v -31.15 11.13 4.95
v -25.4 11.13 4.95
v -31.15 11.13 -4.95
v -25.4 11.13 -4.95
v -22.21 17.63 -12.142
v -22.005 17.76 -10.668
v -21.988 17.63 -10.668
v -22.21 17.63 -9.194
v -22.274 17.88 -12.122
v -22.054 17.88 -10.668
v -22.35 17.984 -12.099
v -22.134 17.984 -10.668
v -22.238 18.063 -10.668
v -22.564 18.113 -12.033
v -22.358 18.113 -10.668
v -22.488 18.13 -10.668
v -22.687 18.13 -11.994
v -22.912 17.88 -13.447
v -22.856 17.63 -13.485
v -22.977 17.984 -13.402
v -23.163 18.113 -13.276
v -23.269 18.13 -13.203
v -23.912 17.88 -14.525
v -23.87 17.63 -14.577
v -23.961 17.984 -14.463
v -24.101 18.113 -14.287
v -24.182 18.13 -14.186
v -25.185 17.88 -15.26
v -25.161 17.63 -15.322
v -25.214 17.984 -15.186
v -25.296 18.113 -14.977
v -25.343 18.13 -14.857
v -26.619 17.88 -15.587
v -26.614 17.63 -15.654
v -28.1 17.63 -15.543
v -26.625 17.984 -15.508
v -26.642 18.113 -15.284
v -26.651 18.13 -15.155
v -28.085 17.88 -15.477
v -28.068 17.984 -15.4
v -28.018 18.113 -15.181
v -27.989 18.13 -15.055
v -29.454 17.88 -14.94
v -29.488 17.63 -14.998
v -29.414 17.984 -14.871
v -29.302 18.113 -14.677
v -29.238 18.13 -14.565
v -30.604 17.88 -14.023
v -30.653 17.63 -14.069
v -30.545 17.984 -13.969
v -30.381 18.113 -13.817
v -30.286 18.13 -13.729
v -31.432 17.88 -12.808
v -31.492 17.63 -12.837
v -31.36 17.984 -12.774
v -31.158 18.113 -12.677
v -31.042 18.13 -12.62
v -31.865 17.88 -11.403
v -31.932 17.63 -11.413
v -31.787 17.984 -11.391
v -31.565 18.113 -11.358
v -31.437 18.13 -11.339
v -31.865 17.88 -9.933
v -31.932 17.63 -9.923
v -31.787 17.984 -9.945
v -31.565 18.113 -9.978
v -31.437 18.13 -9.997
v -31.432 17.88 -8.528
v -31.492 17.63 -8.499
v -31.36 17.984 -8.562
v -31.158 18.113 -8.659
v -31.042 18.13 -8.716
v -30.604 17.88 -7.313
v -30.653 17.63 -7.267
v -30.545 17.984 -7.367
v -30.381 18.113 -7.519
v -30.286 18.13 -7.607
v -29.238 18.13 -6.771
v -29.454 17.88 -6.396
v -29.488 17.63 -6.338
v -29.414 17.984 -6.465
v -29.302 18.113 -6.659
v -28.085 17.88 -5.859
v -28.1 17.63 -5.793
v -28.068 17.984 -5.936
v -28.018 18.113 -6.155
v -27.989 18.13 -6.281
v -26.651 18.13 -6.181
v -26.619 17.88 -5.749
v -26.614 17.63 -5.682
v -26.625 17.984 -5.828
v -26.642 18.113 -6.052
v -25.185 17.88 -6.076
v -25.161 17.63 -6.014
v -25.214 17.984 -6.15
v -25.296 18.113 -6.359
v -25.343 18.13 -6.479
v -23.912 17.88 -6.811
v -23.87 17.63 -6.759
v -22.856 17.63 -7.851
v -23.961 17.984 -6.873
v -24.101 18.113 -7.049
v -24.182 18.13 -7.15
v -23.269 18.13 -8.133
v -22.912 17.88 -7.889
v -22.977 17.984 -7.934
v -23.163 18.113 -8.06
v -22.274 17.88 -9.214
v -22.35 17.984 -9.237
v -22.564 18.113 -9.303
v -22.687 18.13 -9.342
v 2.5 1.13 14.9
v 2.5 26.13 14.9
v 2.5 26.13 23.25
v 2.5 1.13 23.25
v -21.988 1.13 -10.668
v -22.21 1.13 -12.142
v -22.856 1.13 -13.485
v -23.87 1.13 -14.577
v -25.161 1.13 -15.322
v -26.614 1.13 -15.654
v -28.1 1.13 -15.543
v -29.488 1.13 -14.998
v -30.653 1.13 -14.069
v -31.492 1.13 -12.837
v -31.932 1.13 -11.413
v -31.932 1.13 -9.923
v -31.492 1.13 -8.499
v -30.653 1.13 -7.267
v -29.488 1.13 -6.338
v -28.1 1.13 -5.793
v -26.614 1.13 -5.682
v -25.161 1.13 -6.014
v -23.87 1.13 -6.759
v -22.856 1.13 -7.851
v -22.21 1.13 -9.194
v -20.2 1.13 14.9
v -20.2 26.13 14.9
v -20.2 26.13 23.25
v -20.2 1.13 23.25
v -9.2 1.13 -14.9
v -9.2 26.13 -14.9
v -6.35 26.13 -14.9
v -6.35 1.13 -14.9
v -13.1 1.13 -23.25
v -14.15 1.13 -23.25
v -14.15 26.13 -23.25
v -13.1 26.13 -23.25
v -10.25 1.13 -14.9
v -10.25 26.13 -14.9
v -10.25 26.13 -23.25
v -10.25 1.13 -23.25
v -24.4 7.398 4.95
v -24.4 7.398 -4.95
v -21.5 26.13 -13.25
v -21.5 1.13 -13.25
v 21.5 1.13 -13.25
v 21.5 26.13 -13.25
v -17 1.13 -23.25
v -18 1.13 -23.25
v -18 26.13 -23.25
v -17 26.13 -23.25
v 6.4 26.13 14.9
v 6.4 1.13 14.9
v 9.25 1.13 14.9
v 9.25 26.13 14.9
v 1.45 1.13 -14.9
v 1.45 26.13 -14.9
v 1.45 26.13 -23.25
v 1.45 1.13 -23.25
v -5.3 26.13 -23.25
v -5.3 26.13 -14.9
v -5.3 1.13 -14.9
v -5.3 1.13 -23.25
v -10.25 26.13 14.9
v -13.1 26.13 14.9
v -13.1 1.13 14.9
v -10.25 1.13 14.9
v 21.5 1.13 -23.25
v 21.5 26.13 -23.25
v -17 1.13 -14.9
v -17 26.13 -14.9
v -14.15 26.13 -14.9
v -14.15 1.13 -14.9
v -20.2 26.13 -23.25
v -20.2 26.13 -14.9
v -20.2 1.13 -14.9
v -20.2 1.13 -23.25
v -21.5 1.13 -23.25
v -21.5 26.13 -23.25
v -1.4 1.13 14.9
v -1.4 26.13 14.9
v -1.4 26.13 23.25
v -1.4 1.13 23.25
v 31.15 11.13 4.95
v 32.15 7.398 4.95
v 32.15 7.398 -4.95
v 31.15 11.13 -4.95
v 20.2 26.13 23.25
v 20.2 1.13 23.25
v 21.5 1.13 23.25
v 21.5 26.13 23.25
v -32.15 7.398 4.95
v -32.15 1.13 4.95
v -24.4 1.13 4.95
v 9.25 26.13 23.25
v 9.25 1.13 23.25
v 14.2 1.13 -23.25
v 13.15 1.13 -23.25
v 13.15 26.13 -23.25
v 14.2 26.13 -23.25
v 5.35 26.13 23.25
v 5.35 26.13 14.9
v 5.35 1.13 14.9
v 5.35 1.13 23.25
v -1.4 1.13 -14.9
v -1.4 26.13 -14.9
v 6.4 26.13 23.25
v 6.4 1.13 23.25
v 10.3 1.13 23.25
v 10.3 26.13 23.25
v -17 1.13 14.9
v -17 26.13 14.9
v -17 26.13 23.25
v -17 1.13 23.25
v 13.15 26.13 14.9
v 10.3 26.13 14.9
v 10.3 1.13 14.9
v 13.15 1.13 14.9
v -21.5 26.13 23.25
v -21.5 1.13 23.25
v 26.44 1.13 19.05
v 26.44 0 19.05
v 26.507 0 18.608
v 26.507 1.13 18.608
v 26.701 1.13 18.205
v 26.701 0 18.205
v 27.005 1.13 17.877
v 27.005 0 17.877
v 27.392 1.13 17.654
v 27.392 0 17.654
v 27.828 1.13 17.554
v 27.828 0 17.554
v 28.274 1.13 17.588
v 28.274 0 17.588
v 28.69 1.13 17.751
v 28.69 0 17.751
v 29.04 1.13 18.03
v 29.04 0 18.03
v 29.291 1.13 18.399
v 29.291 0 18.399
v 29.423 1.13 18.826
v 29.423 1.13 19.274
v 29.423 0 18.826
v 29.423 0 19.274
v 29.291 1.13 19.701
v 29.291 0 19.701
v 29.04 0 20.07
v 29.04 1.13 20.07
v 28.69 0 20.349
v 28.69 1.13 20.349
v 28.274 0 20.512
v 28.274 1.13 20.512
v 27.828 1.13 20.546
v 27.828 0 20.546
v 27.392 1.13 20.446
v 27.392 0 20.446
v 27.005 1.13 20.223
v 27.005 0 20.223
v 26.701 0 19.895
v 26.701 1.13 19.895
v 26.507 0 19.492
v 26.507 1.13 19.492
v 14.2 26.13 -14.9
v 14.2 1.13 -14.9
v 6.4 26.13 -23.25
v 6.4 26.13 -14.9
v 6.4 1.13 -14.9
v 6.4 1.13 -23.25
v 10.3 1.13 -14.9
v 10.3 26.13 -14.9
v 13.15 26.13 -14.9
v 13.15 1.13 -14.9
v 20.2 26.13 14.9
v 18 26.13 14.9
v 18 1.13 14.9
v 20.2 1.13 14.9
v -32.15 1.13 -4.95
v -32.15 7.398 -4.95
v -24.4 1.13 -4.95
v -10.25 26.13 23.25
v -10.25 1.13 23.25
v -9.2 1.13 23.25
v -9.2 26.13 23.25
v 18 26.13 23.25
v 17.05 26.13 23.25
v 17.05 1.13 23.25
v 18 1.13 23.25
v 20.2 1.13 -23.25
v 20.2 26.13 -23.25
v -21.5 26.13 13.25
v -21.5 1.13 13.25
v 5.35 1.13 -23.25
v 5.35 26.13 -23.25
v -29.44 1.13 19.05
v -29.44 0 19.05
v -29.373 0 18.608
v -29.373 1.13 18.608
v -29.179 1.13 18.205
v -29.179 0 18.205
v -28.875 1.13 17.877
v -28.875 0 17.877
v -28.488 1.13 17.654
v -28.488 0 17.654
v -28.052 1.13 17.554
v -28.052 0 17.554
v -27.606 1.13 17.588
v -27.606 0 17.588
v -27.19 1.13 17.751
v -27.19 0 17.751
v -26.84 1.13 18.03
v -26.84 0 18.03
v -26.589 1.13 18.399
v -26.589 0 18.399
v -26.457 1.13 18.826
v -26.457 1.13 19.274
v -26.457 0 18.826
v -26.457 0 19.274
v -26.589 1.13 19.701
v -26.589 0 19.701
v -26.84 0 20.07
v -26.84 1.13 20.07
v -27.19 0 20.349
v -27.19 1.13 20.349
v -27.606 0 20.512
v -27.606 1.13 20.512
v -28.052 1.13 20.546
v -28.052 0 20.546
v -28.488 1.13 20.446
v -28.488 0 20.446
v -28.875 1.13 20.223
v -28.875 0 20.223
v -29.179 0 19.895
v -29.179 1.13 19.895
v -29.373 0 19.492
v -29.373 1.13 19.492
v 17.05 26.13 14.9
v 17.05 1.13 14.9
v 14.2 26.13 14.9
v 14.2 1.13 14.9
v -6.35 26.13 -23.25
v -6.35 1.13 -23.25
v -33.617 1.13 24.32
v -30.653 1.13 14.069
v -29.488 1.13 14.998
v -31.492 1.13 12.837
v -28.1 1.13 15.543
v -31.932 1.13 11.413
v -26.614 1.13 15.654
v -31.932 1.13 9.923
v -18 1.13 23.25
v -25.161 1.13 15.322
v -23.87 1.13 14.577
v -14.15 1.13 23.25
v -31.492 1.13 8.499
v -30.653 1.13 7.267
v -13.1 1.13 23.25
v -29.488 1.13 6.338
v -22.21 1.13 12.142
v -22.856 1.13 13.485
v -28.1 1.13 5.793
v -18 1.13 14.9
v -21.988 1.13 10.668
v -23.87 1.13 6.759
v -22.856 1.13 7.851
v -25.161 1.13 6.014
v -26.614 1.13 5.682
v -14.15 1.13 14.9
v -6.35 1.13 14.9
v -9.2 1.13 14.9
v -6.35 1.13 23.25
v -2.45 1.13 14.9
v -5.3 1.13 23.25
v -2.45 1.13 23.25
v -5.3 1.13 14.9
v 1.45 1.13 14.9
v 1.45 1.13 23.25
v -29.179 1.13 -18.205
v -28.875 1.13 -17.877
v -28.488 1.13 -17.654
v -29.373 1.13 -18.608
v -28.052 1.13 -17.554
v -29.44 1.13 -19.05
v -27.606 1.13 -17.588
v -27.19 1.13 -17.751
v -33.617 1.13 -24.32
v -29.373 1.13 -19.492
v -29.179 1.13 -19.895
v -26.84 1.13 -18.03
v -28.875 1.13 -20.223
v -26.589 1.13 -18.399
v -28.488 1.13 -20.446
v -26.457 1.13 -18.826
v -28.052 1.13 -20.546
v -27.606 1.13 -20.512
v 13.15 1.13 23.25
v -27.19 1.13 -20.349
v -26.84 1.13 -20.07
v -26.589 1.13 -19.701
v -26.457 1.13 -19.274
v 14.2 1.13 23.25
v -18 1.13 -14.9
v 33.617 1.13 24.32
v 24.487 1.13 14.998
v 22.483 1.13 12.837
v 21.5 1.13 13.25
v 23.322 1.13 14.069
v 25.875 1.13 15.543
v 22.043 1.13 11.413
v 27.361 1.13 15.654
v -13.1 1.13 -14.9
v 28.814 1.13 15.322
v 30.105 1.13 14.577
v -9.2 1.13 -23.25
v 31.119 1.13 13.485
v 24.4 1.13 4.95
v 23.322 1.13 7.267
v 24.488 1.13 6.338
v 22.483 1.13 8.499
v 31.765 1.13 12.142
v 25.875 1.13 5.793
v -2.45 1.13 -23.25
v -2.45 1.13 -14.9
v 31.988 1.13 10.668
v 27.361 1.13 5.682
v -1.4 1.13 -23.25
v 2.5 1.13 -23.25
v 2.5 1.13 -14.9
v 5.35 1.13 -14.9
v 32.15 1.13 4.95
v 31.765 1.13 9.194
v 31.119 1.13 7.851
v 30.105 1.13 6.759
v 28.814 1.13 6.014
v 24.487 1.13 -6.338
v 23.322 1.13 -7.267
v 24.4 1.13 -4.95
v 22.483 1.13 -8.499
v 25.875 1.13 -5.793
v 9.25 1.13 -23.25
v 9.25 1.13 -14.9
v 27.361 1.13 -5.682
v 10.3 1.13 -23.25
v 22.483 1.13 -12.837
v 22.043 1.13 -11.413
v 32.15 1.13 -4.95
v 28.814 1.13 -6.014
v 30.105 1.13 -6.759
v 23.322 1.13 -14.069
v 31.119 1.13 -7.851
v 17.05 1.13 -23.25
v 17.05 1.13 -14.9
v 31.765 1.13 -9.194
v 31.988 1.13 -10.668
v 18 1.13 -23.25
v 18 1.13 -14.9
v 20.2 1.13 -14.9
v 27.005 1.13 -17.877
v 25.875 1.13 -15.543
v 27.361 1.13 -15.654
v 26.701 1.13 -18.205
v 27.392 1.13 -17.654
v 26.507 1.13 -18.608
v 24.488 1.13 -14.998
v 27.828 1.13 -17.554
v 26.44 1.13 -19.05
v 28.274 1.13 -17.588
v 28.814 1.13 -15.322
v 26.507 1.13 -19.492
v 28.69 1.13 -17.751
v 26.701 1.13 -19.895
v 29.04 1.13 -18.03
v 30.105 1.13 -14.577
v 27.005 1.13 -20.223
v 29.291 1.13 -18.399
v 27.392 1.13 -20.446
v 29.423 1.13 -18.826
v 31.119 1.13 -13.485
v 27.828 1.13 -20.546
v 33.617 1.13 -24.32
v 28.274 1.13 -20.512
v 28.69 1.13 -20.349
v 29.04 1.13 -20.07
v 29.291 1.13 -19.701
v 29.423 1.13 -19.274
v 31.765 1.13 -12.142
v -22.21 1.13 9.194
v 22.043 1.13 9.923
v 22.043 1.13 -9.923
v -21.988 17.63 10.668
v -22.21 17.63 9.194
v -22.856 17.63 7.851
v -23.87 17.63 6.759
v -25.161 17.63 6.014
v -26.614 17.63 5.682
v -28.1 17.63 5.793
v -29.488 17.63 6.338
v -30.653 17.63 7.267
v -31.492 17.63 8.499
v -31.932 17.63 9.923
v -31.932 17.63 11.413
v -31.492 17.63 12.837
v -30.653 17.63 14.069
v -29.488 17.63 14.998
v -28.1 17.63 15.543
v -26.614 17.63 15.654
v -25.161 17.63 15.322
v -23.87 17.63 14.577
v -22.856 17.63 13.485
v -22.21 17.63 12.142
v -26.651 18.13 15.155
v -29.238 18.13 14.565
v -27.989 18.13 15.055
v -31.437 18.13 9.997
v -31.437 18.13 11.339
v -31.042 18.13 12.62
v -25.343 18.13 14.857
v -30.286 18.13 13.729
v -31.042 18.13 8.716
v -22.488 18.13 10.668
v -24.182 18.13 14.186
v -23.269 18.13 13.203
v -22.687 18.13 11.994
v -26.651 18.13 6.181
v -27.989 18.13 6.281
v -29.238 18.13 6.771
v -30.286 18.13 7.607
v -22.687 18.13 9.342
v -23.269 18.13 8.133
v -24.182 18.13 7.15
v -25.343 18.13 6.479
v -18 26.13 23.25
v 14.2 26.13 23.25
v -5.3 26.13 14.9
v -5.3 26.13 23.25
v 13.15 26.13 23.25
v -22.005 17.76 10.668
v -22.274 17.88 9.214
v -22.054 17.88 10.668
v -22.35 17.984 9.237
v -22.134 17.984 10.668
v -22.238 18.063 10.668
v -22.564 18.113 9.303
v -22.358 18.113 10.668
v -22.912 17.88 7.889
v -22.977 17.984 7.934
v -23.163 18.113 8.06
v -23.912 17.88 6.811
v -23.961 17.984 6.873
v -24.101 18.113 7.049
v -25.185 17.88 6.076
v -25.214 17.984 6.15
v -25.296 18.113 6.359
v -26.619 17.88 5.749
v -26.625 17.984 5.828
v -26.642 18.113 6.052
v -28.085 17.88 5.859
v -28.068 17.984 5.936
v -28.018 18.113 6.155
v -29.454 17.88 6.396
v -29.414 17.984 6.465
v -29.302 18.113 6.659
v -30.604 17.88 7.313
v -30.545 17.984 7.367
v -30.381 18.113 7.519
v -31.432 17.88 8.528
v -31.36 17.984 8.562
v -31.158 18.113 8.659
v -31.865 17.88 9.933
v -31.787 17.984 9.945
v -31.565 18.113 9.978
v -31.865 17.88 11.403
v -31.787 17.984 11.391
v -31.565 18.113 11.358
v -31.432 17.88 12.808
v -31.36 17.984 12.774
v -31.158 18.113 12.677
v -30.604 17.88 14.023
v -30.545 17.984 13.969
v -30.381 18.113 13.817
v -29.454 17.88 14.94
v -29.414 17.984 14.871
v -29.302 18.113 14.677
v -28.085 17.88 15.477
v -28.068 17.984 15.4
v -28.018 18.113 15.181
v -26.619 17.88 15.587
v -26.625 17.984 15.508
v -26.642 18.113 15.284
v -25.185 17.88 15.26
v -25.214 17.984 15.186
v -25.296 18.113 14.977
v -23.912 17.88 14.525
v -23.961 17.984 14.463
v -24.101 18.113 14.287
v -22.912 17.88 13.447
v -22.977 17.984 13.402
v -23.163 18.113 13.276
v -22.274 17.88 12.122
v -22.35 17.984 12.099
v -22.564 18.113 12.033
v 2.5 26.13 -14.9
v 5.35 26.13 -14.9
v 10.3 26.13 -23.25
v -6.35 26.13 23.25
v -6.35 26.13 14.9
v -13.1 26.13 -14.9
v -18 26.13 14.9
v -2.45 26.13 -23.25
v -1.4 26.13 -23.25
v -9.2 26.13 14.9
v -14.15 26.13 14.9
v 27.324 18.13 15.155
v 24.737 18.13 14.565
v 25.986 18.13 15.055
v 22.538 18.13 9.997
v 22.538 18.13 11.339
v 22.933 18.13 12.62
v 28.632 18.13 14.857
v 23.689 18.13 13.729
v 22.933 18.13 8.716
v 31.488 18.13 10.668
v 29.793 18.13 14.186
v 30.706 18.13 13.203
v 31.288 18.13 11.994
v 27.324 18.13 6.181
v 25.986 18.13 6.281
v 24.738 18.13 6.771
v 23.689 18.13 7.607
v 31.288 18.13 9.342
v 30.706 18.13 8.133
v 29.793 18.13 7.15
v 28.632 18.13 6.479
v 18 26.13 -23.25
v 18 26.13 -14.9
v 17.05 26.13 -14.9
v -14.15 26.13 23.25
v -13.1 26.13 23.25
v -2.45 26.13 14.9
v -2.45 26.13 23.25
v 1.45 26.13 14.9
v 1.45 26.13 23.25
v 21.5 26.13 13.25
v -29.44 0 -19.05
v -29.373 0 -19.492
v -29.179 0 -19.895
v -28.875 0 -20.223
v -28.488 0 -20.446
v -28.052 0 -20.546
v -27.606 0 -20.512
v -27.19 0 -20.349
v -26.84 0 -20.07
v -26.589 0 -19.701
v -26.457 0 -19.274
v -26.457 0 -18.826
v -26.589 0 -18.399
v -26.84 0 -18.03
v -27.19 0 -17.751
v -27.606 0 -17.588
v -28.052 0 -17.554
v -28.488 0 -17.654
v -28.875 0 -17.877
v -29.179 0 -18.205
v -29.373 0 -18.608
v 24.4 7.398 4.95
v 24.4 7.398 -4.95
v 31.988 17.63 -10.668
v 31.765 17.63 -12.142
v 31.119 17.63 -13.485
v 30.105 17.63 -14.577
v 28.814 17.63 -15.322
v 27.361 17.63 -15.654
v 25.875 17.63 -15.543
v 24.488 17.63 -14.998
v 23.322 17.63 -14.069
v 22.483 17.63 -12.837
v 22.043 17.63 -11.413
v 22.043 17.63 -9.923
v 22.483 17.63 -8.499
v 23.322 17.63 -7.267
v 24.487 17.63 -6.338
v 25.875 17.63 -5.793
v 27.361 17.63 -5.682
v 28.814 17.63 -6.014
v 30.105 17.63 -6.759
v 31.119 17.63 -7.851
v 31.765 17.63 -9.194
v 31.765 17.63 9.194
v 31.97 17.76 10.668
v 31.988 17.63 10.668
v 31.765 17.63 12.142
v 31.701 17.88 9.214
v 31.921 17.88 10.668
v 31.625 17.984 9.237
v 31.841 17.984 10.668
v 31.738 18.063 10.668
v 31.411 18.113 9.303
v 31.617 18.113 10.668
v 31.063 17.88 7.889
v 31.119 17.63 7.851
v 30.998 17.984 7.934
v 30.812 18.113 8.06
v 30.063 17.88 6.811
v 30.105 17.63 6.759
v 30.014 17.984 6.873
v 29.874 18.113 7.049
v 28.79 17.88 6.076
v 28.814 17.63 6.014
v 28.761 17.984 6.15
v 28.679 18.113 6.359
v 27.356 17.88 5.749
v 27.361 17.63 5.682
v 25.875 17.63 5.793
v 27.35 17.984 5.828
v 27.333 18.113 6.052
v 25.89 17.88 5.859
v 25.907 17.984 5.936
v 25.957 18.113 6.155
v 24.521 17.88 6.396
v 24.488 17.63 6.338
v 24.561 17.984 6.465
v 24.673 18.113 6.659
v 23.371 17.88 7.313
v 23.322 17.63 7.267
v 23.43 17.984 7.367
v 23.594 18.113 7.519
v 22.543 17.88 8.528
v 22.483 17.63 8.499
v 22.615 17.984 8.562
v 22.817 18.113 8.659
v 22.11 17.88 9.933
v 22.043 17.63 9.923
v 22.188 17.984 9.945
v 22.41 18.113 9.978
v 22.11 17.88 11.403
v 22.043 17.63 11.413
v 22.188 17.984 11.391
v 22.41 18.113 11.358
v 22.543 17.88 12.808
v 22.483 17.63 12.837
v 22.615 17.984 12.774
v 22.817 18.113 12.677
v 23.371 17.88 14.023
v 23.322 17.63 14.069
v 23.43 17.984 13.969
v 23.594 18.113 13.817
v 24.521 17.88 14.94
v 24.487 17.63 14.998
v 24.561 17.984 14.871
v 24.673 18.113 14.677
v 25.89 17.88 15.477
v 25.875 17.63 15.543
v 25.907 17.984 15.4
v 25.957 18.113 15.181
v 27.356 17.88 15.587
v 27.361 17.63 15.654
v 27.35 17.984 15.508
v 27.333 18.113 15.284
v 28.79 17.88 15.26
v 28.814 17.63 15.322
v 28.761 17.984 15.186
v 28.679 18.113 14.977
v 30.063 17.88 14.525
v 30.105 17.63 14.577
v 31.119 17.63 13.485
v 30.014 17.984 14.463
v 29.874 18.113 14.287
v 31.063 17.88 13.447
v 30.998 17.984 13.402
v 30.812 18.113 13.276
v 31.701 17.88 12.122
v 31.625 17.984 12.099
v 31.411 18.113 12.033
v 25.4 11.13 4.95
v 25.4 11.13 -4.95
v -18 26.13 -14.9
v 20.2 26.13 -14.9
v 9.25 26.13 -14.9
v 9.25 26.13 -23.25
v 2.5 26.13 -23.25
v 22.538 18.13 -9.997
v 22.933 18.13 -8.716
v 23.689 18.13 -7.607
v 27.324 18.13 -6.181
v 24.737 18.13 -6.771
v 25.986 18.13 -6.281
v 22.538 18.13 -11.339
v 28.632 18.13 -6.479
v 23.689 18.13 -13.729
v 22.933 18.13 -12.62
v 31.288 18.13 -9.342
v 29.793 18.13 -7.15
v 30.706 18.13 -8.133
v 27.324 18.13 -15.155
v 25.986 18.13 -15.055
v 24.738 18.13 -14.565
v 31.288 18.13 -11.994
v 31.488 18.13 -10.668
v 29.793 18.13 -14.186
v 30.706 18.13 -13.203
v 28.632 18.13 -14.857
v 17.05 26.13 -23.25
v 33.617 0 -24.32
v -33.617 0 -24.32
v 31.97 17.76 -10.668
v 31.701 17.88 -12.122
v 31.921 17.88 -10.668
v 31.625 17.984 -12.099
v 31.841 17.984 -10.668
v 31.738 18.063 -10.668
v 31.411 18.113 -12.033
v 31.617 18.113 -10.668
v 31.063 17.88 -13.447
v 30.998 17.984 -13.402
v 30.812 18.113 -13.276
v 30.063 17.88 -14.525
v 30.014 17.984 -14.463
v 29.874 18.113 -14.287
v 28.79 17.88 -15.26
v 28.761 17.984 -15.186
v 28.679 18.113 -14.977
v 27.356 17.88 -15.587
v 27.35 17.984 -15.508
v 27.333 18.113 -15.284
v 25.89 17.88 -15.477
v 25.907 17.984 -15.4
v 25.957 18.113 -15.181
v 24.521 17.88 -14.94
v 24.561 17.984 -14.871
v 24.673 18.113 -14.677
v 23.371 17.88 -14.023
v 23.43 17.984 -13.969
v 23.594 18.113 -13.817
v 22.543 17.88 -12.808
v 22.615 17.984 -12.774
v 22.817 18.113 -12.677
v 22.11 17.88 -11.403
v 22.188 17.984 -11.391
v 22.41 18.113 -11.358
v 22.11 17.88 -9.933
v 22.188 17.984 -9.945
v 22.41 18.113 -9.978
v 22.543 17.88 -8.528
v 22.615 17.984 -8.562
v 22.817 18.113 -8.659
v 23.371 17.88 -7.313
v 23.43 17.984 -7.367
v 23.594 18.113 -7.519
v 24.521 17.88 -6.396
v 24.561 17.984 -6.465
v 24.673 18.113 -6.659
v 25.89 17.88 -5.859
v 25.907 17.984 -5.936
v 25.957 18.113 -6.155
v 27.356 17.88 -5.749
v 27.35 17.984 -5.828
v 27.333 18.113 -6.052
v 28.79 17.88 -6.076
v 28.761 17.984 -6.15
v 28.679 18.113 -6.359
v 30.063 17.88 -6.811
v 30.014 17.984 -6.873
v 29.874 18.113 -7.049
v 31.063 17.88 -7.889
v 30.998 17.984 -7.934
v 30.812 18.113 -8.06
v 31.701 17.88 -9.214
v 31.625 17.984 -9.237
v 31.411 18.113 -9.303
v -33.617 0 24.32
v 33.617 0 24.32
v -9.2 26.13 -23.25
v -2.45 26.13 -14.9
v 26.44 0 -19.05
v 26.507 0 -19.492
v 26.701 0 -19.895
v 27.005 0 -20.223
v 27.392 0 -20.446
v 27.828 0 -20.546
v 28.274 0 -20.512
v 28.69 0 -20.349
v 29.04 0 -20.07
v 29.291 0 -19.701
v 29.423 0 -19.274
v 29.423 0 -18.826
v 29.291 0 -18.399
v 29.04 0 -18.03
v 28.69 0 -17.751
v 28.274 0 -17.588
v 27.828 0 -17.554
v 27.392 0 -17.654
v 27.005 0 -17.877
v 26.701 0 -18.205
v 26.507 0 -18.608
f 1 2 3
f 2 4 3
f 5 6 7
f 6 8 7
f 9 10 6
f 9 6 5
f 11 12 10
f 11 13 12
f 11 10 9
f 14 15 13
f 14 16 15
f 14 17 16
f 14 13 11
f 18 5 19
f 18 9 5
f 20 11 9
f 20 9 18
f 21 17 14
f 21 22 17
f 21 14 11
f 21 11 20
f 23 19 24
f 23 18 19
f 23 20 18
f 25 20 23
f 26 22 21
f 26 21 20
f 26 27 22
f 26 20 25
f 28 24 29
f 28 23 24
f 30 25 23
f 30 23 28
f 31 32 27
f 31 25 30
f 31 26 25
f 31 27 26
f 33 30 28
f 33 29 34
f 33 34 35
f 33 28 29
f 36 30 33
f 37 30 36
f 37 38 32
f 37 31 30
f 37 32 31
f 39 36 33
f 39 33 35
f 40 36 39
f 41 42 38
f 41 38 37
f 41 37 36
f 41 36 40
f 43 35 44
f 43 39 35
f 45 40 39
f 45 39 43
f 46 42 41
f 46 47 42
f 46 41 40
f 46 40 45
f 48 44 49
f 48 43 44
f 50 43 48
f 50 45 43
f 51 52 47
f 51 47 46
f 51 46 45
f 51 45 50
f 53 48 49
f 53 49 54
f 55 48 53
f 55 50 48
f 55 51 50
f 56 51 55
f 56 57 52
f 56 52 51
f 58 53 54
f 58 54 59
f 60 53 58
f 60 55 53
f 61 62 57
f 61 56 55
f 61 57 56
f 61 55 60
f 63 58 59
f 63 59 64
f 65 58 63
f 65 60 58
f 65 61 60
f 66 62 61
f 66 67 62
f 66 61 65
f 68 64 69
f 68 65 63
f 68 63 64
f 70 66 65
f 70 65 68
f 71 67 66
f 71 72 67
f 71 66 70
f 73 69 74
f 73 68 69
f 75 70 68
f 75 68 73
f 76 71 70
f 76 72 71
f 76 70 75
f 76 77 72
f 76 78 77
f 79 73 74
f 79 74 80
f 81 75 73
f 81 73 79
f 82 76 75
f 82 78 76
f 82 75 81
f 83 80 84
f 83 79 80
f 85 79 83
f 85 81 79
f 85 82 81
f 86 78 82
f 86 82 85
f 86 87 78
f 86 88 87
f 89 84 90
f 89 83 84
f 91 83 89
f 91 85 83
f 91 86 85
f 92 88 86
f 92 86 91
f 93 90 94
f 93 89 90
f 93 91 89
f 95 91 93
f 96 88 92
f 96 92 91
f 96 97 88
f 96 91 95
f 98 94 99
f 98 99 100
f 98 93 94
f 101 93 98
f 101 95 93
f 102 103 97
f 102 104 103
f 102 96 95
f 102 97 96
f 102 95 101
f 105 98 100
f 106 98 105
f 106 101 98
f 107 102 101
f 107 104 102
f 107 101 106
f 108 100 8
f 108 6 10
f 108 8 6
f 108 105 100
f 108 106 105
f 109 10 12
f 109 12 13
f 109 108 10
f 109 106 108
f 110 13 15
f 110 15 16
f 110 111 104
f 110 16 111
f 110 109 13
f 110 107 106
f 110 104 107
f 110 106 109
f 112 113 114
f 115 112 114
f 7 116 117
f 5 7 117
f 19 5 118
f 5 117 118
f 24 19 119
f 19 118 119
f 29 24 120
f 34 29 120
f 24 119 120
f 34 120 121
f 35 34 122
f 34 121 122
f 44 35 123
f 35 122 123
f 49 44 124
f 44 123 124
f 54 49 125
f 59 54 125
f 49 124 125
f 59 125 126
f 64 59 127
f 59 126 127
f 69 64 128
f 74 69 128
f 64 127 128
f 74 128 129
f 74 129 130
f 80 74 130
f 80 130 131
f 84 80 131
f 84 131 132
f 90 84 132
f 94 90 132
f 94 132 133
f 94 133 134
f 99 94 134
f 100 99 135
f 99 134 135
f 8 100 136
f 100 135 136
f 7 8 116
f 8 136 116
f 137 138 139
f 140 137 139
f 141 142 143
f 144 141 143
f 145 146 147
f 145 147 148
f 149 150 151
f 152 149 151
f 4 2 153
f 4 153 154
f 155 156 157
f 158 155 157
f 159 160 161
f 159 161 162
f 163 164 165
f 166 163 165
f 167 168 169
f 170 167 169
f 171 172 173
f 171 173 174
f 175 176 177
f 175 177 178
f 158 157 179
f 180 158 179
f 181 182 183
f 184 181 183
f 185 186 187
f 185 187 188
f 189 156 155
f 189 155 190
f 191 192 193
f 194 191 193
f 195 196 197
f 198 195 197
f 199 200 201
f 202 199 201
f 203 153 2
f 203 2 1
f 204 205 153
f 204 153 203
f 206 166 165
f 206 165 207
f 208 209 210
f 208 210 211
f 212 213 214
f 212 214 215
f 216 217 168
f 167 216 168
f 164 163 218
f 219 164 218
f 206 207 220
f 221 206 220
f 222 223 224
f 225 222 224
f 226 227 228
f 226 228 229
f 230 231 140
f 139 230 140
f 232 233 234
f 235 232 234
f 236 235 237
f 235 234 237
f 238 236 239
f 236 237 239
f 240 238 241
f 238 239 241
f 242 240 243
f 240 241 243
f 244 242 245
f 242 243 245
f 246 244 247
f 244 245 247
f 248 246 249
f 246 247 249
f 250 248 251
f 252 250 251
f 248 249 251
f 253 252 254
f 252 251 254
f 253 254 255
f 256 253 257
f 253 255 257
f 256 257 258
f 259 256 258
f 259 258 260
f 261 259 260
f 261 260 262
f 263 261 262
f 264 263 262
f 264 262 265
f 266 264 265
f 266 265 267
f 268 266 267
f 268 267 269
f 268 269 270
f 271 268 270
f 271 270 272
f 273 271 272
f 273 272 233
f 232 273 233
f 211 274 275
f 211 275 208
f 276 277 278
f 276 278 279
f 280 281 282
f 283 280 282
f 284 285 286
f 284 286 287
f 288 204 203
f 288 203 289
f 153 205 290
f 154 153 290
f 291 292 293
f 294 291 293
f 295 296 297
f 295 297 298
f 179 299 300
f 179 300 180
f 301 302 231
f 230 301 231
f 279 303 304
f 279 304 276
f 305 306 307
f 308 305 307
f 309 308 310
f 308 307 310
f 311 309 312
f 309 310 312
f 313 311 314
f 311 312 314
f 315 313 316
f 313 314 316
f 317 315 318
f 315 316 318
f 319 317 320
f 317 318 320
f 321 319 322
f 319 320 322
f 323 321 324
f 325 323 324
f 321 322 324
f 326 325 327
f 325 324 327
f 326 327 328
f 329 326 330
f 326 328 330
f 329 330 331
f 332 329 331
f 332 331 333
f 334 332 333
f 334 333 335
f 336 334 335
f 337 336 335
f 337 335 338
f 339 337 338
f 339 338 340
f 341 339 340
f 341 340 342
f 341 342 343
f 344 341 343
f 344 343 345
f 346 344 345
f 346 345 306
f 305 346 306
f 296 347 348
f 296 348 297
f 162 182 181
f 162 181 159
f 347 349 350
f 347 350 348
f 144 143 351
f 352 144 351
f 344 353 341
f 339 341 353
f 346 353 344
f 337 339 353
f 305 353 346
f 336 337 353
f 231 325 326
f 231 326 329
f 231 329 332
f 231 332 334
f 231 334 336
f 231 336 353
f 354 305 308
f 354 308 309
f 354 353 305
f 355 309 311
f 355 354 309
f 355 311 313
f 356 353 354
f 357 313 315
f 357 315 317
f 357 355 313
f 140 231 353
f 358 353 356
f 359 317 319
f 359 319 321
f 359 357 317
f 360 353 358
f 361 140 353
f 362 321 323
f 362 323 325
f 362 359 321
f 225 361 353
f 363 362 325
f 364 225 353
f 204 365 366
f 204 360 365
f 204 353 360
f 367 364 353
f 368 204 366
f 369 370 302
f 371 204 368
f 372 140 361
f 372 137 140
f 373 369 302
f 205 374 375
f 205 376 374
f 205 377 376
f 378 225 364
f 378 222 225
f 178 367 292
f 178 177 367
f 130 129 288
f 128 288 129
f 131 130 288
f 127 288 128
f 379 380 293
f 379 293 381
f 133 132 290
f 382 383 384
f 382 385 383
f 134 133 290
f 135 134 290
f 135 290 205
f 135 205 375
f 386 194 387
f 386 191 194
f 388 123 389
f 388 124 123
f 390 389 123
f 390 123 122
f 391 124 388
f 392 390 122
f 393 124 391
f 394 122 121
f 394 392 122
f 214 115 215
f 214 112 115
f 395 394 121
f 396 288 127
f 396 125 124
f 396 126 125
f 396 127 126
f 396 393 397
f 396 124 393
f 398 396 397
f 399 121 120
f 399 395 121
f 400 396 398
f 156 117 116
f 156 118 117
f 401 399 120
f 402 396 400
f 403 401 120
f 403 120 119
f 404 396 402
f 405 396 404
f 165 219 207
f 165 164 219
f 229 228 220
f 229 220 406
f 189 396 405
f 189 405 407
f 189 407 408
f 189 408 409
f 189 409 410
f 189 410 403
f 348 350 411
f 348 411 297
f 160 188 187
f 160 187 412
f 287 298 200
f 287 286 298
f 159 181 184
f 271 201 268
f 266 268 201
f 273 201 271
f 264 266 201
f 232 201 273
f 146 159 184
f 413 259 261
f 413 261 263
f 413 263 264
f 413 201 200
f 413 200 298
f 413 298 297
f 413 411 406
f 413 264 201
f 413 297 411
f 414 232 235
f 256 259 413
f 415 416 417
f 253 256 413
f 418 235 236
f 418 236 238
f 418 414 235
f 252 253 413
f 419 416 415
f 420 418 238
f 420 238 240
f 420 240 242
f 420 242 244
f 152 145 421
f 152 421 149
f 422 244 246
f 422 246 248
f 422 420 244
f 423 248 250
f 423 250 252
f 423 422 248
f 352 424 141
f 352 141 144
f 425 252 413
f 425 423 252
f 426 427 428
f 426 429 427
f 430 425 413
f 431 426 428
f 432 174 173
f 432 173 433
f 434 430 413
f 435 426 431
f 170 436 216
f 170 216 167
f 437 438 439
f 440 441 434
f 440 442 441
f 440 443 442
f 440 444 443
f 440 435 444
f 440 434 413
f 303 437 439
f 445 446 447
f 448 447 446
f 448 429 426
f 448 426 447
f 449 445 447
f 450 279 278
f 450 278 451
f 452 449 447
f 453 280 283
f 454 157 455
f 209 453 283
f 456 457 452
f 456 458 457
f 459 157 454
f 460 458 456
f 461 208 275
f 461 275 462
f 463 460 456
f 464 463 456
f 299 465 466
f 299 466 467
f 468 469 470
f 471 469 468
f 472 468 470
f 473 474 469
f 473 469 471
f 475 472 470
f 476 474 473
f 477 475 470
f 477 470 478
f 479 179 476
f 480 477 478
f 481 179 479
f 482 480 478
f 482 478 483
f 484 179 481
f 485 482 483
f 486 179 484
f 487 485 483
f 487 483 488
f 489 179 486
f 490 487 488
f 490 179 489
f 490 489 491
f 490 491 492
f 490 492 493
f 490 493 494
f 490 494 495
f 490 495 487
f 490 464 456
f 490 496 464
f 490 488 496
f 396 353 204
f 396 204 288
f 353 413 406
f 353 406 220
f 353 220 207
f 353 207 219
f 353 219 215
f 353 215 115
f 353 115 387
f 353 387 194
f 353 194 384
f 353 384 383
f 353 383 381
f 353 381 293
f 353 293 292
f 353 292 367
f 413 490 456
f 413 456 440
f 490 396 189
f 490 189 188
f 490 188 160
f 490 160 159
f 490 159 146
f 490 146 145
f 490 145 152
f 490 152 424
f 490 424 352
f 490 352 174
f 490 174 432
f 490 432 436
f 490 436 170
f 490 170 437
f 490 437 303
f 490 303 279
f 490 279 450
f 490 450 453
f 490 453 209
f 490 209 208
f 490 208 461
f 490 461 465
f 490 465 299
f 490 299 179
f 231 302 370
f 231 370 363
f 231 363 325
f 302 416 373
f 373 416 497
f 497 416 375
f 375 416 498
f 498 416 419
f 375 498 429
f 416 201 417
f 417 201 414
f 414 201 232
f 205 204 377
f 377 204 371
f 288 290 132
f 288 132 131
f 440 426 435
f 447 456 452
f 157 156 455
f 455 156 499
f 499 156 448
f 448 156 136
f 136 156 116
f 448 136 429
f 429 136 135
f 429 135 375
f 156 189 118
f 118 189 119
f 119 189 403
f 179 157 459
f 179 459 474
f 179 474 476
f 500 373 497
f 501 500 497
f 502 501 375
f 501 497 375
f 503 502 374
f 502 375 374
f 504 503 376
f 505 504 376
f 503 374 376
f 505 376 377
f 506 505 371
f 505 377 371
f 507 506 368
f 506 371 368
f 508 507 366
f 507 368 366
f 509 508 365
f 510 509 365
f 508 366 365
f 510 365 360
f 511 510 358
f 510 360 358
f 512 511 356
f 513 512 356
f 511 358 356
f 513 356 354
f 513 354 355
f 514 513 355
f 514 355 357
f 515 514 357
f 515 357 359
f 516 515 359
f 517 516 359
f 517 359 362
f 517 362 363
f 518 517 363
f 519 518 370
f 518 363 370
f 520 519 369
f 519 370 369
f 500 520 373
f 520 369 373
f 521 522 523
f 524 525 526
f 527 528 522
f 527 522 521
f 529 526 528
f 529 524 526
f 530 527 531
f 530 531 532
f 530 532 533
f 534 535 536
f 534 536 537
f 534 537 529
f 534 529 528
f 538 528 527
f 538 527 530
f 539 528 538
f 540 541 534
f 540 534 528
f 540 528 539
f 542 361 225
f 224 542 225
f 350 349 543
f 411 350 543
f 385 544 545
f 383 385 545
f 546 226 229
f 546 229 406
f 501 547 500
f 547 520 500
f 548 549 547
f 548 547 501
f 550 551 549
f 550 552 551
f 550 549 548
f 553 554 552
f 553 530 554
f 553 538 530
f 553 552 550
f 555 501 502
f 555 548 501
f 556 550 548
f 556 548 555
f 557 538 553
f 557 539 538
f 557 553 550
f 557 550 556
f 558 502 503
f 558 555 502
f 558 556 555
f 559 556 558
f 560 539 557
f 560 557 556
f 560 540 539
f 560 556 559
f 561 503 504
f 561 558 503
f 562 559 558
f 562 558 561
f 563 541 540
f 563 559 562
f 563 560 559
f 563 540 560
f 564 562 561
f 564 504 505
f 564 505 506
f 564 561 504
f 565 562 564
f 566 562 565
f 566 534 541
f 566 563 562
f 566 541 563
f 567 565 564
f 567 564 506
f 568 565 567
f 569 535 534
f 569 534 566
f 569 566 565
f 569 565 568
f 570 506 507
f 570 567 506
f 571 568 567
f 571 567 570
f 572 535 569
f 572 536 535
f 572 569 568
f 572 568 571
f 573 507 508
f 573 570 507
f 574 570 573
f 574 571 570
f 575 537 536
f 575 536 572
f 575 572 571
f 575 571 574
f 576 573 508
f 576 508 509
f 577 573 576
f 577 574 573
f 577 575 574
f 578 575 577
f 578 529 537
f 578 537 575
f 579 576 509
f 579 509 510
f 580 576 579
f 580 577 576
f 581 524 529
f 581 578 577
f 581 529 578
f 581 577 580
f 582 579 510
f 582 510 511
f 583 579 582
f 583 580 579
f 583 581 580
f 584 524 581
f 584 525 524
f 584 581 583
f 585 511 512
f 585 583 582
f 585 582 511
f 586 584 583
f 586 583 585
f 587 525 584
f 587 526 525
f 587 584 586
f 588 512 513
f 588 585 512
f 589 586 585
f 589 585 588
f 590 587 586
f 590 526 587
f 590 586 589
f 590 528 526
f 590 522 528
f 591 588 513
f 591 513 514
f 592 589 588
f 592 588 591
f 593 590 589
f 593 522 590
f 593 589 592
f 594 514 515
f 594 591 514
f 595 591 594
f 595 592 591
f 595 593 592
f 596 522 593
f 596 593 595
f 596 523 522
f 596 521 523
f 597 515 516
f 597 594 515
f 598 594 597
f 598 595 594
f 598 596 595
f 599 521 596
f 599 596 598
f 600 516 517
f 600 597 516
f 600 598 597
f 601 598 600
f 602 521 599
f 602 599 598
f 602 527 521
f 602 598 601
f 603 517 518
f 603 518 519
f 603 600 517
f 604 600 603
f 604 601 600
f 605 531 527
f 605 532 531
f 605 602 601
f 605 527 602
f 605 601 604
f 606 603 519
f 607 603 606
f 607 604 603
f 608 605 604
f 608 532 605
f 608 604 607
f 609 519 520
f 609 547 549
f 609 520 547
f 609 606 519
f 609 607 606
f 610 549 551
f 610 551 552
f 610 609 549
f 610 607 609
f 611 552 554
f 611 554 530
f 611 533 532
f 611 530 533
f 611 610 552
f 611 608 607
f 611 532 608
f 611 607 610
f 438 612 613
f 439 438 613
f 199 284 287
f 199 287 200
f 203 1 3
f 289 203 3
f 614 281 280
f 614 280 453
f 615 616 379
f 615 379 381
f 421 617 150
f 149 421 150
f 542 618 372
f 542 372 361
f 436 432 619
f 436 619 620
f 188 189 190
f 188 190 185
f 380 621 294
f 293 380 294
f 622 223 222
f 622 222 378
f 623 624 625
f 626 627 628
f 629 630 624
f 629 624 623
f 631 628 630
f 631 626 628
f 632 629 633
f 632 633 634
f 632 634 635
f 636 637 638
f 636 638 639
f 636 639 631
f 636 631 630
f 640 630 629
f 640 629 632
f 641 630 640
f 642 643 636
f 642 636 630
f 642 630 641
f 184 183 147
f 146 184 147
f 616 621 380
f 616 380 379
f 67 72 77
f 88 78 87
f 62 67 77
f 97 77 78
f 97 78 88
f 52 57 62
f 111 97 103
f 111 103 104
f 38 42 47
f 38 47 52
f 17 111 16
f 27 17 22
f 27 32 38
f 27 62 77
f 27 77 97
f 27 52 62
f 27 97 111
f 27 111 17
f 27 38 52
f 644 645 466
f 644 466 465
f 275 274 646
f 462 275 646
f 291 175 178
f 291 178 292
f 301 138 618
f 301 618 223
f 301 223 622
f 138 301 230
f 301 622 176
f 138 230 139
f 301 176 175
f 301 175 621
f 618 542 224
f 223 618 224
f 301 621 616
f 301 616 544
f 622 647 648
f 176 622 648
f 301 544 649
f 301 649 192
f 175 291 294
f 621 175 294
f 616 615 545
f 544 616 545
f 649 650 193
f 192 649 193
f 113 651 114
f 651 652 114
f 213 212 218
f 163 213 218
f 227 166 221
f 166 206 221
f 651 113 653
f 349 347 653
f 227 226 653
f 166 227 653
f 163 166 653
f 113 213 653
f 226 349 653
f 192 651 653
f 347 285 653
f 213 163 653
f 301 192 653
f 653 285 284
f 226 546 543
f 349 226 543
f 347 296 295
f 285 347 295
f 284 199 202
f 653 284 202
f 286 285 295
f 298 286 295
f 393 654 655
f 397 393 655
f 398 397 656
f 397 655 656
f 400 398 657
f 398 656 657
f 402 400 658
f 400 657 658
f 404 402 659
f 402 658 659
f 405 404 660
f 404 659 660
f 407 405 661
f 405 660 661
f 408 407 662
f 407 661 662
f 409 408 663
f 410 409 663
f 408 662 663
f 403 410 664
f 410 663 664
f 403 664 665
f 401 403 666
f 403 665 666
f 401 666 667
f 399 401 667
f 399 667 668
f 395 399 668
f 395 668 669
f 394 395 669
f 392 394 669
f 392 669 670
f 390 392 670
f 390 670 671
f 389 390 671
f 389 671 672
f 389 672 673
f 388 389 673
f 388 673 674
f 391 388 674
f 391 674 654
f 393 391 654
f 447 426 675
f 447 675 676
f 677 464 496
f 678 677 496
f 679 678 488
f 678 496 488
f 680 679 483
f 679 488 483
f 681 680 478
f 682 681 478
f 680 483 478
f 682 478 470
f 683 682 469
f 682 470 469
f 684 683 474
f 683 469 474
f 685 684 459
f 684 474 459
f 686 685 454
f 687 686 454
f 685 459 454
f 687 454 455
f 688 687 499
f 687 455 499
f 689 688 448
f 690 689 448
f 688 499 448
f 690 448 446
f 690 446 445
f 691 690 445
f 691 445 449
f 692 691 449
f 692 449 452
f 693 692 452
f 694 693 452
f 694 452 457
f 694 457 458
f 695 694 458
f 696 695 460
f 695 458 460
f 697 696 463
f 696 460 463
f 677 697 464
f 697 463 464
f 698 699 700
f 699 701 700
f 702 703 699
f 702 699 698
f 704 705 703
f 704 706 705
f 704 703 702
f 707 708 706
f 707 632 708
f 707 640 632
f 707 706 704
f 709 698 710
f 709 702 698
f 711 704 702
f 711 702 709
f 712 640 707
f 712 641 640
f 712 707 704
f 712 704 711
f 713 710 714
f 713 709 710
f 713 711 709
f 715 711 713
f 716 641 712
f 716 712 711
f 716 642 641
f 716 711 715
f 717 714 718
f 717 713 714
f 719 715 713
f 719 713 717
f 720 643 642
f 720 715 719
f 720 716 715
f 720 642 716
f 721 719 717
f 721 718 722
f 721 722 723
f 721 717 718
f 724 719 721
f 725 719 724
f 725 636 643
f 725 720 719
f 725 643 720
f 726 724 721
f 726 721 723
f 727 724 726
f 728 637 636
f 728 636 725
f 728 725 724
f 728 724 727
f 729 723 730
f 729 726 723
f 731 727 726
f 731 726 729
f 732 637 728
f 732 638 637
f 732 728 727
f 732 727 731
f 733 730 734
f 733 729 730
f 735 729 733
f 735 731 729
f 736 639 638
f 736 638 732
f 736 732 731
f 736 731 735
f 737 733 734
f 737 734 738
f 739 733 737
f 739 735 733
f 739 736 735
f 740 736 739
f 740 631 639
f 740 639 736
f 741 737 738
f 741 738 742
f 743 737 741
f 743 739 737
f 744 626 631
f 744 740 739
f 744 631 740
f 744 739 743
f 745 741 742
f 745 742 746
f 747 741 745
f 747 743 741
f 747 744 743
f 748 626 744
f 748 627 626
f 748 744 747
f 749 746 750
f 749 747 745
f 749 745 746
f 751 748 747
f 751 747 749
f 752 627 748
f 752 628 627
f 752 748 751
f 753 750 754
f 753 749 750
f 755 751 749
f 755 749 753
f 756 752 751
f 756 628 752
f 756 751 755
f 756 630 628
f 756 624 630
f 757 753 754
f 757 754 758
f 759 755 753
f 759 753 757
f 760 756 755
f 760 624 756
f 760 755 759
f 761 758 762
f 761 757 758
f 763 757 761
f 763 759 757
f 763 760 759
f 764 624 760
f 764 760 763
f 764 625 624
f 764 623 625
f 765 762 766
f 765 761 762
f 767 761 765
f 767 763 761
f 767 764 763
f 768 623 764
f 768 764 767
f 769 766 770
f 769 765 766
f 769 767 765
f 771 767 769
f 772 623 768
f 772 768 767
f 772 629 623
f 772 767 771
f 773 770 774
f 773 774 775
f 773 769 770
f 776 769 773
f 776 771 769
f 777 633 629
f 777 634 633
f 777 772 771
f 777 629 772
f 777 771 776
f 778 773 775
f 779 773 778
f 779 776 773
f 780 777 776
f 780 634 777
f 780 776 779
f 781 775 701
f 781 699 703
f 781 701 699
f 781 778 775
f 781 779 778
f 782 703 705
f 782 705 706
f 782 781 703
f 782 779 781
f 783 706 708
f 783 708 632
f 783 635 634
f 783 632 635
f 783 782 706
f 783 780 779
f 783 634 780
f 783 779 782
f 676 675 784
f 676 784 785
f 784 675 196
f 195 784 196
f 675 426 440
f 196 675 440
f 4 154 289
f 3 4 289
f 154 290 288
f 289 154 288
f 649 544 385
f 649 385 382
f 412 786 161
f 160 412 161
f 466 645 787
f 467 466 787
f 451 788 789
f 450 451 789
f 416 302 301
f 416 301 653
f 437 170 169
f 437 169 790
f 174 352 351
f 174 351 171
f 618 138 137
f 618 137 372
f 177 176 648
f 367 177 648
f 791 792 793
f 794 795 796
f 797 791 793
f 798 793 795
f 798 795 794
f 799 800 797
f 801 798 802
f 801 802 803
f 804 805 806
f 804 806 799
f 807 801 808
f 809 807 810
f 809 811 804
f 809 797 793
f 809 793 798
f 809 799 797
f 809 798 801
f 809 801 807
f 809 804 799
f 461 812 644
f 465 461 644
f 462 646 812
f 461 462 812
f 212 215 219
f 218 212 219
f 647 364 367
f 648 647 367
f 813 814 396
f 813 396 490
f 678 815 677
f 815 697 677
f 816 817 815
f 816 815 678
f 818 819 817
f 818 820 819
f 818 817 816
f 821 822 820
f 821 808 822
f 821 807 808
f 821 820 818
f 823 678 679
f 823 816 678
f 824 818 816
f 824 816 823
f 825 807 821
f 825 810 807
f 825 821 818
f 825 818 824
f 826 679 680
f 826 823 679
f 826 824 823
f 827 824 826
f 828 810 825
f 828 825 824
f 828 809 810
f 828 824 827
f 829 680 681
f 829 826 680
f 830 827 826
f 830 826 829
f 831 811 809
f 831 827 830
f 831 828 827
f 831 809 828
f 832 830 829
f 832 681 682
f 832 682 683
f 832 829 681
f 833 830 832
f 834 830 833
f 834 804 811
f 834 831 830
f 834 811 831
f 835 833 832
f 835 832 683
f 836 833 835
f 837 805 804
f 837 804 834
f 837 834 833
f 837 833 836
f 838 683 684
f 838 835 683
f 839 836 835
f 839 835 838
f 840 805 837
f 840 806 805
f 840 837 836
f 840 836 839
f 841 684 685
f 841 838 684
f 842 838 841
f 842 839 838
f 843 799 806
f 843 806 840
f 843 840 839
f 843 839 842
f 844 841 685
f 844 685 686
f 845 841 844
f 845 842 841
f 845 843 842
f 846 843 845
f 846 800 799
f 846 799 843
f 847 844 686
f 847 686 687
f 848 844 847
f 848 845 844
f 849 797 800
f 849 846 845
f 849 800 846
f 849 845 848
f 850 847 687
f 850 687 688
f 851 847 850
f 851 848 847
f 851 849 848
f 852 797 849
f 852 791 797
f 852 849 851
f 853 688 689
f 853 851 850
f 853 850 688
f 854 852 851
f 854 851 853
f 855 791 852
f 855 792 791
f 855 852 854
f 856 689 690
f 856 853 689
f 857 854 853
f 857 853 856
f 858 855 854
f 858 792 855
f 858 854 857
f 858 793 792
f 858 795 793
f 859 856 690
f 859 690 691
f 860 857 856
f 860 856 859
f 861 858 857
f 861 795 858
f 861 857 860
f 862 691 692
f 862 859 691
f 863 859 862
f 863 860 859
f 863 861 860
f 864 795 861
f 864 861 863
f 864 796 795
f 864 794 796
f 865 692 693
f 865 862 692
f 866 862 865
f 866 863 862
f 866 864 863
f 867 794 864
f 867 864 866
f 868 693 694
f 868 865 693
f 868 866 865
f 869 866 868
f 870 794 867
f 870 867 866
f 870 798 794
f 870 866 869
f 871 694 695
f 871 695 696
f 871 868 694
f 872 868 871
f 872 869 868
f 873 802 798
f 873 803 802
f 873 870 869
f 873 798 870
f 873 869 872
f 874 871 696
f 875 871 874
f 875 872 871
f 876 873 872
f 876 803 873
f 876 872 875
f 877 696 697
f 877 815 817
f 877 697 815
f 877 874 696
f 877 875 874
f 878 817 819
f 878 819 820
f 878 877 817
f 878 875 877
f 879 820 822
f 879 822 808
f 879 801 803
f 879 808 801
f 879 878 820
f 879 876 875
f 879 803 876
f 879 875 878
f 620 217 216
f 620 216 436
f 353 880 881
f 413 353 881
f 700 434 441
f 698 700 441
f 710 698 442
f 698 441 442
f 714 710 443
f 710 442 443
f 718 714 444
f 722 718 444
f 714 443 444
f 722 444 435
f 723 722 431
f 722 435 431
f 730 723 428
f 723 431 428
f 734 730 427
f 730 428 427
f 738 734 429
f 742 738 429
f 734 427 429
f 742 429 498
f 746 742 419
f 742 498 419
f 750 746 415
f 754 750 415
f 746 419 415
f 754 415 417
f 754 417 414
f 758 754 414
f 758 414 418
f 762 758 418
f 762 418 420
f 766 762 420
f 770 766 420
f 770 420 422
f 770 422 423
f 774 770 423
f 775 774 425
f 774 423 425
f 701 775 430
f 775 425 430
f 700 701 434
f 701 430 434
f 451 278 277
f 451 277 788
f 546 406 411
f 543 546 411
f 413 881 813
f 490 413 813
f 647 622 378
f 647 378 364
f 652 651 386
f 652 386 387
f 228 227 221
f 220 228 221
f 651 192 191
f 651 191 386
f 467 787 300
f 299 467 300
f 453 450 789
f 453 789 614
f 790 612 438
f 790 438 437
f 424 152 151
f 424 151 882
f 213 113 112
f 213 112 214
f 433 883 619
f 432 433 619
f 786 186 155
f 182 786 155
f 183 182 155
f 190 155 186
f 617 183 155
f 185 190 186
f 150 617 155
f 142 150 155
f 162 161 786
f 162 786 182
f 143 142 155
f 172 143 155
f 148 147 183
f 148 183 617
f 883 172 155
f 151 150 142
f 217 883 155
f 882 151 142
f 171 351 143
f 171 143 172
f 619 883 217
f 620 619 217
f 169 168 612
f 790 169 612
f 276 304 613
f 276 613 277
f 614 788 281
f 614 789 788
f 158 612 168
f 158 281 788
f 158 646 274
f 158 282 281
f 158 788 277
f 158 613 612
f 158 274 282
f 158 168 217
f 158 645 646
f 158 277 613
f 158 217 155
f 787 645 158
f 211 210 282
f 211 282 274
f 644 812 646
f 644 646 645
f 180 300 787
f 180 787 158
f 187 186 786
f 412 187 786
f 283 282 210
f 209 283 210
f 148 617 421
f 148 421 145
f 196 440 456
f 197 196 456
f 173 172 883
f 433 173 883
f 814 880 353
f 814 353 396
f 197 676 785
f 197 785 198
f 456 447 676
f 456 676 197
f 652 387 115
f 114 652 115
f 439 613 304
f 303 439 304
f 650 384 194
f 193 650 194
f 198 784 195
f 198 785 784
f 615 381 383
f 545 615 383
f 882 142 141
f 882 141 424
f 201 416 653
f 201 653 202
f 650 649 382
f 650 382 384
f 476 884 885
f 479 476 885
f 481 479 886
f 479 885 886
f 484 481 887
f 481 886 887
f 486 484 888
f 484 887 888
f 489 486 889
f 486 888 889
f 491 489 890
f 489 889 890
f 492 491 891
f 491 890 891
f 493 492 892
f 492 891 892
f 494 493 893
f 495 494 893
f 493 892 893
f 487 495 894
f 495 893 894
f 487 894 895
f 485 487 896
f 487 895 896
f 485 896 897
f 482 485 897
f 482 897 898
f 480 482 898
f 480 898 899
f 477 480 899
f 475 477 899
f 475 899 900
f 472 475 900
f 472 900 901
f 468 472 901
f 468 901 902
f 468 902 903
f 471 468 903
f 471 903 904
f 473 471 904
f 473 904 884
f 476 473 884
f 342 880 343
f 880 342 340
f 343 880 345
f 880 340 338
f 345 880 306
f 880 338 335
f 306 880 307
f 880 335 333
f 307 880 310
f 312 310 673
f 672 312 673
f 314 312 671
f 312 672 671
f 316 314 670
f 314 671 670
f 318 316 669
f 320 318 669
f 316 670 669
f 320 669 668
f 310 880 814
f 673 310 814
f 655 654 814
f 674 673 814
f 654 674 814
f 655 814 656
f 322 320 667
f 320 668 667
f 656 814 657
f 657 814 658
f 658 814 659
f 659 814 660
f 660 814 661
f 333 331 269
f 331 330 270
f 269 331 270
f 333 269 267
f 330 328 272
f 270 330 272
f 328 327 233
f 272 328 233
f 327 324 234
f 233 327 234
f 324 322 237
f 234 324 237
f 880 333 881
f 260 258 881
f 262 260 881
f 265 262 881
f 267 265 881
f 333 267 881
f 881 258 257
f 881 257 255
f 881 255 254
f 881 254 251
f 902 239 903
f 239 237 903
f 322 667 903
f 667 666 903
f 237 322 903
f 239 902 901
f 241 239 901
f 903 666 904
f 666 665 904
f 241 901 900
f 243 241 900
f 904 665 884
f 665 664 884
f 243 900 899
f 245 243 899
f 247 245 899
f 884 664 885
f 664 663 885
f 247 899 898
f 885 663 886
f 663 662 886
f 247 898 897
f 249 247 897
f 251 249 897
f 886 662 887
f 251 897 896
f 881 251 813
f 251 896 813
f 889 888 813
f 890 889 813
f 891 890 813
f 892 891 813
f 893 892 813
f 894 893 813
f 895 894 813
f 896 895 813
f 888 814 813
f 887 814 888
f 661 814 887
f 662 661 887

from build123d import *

# Parameters (mm, degrees)
SKETCH1_W                 = 67.2338
SKETCH1_H                 = 48.641
BOSS_EXTRUDE1_DEPTH       = 1.1303
F_3_0MM_DOWEL_HOLE1_D     = 3
SKETCH5_R                 = 5
BOSS_EXTRUDE2_DEPTH       = 17
FILLET1_R                 = 0.5
SKETCH6_W                 = 43
SKETCH6_H                 = 10
BOSS_EXTRUDE3_DEPTH       = 25
SKETCH7_W                 = 2.2
SKETCH7_H                 = 8.35
SKETCH7_W_2               = 2.85
CUT_EXTRUDE1_DEPTH        = 25
SKETCH8_W                 = 7.75
SKETCH8_H                 = 9.9
BOSS_EXTRUDE4_DEPTH       = 10
CHAMFER1_SIZE             = 1
CHAMFER1_SIZE2            = 3.732050808
CHAMFER1_OF_MIRROR2_SIZE2 = 1
CHAMFER1_OF_MIRROR2_SIZE  = 3.732050808


with BuildPart() as part:
    # Sketch1 → Boss-Extrude1 (new body)
    with BuildSketch(Plane(origin=(0, 0, 0), x_dir=(1, 0, 0), z_dir=(0, 1, 0))):
        Rectangle(SKETCH1_W, SKETCH1_H)
    extrude(amount=BOSS_EXTRUDE1_DEPTH)

    # Ø3.0mm Dowel Hole1 (through all)
    with Locations(Plane(origin=(0, 1.1303, 0), x_dir=(1, 0, 0), z_dir=(0, 1, 0))):
        with Locations((-27.94, -19.05), (-27.94, 19.05), (27.94, 19.05), (27.94, -19.05)):
            Hole(F_3_0MM_DOWEL_HOLE1_D / 2)

    # Sketch5 → Boss-Extrude2 (add)
    with BuildSketch(Plane(origin=(0, 1.1303, 0), x_dir=(1, 0, 0), z_dir=(0, 1, 0))):
        with Locations((-26.9875, 10.668)):
            Circle(SKETCH5_R)
        with Locations((-26.9875, -10.668)):
            Circle(SKETCH5_R)
        with Locations((26.9875, 10.668)):
            Circle(SKETCH5_R)
        with Locations((26.9875, -10.668)):
            Circle(SKETCH5_R)
    extrude(amount=BOSS_EXTRUDE2_DEPTH)

    # Fillet1
    fillet1_edges = [part.edges().sort_by_distance(p)[0] for p in [
        (-31.9875, 18.1303, -10.668),
        (-31.9875, 18.1303, 10.668),
        (21.9875, 18.1303, -10.668),
        (21.9875, 18.1303, 10.668),
    ]]
    fillet(fillet1_edges, radius=FILLET1_R)

    # Sketch6 → Boss-Extrude3 (add)
    with BuildSketch(Plane(origin=(0, 1.1303, 0), x_dir=(1, 0, 0), z_dir=(0, 1, 0))):
        with Locations((0, 18.25)):
            Rectangle(SKETCH6_W, SKETCH6_H)
    boss_extrude3 = extrude(amount=BOSS_EXTRUDE3_DEPTH)

    # Sketch7 → Cut-Extrude1 (cut)
    with BuildSketch(Plane(origin=(0, 26.1303, 0), x_dir=(1, 0, 0), z_dir=(0, 1, 0))):
        with Locations((-19.1, 19.075)):
            Rectangle(SKETCH7_W, SKETCH7_H)
        with Locations((-15.575, 19.075)):
            Rectangle(SKETCH7_W_2, SKETCH7_H)
        with Locations((19.1, 19.075)):
            Rectangle(SKETCH7_W, SKETCH7_H)
        with Locations((-11.675, 19.075)):
            Rectangle(SKETCH7_W_2, SKETCH7_H)
        with Locations((-7.775, 19.075)):
            Rectangle(SKETCH7_W_2, SKETCH7_H)
        with Locations((-3.875, 19.075)):
            Rectangle(SKETCH7_W_2, SKETCH7_H)
        with Locations((0.025, 19.075)):
            Rectangle(SKETCH7_W_2, SKETCH7_H)
        with Locations((3.925, 19.075)):
            Rectangle(SKETCH7_W_2, SKETCH7_H)
        with Locations((7.825, 19.075)):
            Rectangle(SKETCH7_W_2, SKETCH7_H)
        with Locations((11.725, 19.075)):
            Rectangle(SKETCH7_W_2, SKETCH7_H)
        with Locations((15.625, 19.075)):
            Rectangle(SKETCH7_W_2, SKETCH7_H)
    cut_extrude1 = extrude(amount=-CUT_EXTRUDE1_DEPTH, mode=Mode.SUBTRACT)

    # Mirror1: Boss-Extrude3, Cut-Extrude1 across plane
    add(boss_extrude3.mirror(Plane.XY))
    add(cut_extrude1.mirror(Plane.XY), mode=Mode.SUBTRACT)

    # Sketch8 → Boss-Extrude4 (add)
    with BuildSketch(Plane(origin=(0, 1.1303, 0), x_dir=(1, 0, 0), z_dir=(0, 1, 0))):
        with Locations((28.275, 0)):
            Rectangle(SKETCH8_W, SKETCH8_H)
    boss_extrude4 = extrude(amount=BOSS_EXTRUDE4_DEPTH)

    # Chamfer1
    chamfer1_edges = [part.edges().sort_by_distance(p)[0] for p in [
        (24.4, 11.1303, 0),
        (32.15, 11.1303, 0),
    ]]
    chamfer1_side = [part.faces().sort_by_distance(p)[0] for p in [
        (28.275, 11.1303, 0),
    ]]
    chamfer(chamfer1_edges, length=CHAMFER1_SIZE, length2=CHAMFER1_SIZE2, reference=chamfer1_side[0])

    # Mirror2: Boss-Extrude4 across plane
    add(boss_extrude4.mirror(Plane(origin=(0, 0, 0), x_dir=(0, 0, 1), z_dir=(1, 0, 0))))

    # Chamfer1 of Mirror2
    chamfer1_of_mirror2_edges = [part.edges().sort_by_distance(p)[0] for p in [
        (-24.4, 11.1303, 0),
        (-32.15, 11.1303, 0),
    ]]
    chamfer(chamfer1_of_mirror2_edges, length=CHAMFER1_OF_MIRROR2_SIZE, length2=CHAMFER1_OF_MIRROR2_SIZE2)


solid = part.part
